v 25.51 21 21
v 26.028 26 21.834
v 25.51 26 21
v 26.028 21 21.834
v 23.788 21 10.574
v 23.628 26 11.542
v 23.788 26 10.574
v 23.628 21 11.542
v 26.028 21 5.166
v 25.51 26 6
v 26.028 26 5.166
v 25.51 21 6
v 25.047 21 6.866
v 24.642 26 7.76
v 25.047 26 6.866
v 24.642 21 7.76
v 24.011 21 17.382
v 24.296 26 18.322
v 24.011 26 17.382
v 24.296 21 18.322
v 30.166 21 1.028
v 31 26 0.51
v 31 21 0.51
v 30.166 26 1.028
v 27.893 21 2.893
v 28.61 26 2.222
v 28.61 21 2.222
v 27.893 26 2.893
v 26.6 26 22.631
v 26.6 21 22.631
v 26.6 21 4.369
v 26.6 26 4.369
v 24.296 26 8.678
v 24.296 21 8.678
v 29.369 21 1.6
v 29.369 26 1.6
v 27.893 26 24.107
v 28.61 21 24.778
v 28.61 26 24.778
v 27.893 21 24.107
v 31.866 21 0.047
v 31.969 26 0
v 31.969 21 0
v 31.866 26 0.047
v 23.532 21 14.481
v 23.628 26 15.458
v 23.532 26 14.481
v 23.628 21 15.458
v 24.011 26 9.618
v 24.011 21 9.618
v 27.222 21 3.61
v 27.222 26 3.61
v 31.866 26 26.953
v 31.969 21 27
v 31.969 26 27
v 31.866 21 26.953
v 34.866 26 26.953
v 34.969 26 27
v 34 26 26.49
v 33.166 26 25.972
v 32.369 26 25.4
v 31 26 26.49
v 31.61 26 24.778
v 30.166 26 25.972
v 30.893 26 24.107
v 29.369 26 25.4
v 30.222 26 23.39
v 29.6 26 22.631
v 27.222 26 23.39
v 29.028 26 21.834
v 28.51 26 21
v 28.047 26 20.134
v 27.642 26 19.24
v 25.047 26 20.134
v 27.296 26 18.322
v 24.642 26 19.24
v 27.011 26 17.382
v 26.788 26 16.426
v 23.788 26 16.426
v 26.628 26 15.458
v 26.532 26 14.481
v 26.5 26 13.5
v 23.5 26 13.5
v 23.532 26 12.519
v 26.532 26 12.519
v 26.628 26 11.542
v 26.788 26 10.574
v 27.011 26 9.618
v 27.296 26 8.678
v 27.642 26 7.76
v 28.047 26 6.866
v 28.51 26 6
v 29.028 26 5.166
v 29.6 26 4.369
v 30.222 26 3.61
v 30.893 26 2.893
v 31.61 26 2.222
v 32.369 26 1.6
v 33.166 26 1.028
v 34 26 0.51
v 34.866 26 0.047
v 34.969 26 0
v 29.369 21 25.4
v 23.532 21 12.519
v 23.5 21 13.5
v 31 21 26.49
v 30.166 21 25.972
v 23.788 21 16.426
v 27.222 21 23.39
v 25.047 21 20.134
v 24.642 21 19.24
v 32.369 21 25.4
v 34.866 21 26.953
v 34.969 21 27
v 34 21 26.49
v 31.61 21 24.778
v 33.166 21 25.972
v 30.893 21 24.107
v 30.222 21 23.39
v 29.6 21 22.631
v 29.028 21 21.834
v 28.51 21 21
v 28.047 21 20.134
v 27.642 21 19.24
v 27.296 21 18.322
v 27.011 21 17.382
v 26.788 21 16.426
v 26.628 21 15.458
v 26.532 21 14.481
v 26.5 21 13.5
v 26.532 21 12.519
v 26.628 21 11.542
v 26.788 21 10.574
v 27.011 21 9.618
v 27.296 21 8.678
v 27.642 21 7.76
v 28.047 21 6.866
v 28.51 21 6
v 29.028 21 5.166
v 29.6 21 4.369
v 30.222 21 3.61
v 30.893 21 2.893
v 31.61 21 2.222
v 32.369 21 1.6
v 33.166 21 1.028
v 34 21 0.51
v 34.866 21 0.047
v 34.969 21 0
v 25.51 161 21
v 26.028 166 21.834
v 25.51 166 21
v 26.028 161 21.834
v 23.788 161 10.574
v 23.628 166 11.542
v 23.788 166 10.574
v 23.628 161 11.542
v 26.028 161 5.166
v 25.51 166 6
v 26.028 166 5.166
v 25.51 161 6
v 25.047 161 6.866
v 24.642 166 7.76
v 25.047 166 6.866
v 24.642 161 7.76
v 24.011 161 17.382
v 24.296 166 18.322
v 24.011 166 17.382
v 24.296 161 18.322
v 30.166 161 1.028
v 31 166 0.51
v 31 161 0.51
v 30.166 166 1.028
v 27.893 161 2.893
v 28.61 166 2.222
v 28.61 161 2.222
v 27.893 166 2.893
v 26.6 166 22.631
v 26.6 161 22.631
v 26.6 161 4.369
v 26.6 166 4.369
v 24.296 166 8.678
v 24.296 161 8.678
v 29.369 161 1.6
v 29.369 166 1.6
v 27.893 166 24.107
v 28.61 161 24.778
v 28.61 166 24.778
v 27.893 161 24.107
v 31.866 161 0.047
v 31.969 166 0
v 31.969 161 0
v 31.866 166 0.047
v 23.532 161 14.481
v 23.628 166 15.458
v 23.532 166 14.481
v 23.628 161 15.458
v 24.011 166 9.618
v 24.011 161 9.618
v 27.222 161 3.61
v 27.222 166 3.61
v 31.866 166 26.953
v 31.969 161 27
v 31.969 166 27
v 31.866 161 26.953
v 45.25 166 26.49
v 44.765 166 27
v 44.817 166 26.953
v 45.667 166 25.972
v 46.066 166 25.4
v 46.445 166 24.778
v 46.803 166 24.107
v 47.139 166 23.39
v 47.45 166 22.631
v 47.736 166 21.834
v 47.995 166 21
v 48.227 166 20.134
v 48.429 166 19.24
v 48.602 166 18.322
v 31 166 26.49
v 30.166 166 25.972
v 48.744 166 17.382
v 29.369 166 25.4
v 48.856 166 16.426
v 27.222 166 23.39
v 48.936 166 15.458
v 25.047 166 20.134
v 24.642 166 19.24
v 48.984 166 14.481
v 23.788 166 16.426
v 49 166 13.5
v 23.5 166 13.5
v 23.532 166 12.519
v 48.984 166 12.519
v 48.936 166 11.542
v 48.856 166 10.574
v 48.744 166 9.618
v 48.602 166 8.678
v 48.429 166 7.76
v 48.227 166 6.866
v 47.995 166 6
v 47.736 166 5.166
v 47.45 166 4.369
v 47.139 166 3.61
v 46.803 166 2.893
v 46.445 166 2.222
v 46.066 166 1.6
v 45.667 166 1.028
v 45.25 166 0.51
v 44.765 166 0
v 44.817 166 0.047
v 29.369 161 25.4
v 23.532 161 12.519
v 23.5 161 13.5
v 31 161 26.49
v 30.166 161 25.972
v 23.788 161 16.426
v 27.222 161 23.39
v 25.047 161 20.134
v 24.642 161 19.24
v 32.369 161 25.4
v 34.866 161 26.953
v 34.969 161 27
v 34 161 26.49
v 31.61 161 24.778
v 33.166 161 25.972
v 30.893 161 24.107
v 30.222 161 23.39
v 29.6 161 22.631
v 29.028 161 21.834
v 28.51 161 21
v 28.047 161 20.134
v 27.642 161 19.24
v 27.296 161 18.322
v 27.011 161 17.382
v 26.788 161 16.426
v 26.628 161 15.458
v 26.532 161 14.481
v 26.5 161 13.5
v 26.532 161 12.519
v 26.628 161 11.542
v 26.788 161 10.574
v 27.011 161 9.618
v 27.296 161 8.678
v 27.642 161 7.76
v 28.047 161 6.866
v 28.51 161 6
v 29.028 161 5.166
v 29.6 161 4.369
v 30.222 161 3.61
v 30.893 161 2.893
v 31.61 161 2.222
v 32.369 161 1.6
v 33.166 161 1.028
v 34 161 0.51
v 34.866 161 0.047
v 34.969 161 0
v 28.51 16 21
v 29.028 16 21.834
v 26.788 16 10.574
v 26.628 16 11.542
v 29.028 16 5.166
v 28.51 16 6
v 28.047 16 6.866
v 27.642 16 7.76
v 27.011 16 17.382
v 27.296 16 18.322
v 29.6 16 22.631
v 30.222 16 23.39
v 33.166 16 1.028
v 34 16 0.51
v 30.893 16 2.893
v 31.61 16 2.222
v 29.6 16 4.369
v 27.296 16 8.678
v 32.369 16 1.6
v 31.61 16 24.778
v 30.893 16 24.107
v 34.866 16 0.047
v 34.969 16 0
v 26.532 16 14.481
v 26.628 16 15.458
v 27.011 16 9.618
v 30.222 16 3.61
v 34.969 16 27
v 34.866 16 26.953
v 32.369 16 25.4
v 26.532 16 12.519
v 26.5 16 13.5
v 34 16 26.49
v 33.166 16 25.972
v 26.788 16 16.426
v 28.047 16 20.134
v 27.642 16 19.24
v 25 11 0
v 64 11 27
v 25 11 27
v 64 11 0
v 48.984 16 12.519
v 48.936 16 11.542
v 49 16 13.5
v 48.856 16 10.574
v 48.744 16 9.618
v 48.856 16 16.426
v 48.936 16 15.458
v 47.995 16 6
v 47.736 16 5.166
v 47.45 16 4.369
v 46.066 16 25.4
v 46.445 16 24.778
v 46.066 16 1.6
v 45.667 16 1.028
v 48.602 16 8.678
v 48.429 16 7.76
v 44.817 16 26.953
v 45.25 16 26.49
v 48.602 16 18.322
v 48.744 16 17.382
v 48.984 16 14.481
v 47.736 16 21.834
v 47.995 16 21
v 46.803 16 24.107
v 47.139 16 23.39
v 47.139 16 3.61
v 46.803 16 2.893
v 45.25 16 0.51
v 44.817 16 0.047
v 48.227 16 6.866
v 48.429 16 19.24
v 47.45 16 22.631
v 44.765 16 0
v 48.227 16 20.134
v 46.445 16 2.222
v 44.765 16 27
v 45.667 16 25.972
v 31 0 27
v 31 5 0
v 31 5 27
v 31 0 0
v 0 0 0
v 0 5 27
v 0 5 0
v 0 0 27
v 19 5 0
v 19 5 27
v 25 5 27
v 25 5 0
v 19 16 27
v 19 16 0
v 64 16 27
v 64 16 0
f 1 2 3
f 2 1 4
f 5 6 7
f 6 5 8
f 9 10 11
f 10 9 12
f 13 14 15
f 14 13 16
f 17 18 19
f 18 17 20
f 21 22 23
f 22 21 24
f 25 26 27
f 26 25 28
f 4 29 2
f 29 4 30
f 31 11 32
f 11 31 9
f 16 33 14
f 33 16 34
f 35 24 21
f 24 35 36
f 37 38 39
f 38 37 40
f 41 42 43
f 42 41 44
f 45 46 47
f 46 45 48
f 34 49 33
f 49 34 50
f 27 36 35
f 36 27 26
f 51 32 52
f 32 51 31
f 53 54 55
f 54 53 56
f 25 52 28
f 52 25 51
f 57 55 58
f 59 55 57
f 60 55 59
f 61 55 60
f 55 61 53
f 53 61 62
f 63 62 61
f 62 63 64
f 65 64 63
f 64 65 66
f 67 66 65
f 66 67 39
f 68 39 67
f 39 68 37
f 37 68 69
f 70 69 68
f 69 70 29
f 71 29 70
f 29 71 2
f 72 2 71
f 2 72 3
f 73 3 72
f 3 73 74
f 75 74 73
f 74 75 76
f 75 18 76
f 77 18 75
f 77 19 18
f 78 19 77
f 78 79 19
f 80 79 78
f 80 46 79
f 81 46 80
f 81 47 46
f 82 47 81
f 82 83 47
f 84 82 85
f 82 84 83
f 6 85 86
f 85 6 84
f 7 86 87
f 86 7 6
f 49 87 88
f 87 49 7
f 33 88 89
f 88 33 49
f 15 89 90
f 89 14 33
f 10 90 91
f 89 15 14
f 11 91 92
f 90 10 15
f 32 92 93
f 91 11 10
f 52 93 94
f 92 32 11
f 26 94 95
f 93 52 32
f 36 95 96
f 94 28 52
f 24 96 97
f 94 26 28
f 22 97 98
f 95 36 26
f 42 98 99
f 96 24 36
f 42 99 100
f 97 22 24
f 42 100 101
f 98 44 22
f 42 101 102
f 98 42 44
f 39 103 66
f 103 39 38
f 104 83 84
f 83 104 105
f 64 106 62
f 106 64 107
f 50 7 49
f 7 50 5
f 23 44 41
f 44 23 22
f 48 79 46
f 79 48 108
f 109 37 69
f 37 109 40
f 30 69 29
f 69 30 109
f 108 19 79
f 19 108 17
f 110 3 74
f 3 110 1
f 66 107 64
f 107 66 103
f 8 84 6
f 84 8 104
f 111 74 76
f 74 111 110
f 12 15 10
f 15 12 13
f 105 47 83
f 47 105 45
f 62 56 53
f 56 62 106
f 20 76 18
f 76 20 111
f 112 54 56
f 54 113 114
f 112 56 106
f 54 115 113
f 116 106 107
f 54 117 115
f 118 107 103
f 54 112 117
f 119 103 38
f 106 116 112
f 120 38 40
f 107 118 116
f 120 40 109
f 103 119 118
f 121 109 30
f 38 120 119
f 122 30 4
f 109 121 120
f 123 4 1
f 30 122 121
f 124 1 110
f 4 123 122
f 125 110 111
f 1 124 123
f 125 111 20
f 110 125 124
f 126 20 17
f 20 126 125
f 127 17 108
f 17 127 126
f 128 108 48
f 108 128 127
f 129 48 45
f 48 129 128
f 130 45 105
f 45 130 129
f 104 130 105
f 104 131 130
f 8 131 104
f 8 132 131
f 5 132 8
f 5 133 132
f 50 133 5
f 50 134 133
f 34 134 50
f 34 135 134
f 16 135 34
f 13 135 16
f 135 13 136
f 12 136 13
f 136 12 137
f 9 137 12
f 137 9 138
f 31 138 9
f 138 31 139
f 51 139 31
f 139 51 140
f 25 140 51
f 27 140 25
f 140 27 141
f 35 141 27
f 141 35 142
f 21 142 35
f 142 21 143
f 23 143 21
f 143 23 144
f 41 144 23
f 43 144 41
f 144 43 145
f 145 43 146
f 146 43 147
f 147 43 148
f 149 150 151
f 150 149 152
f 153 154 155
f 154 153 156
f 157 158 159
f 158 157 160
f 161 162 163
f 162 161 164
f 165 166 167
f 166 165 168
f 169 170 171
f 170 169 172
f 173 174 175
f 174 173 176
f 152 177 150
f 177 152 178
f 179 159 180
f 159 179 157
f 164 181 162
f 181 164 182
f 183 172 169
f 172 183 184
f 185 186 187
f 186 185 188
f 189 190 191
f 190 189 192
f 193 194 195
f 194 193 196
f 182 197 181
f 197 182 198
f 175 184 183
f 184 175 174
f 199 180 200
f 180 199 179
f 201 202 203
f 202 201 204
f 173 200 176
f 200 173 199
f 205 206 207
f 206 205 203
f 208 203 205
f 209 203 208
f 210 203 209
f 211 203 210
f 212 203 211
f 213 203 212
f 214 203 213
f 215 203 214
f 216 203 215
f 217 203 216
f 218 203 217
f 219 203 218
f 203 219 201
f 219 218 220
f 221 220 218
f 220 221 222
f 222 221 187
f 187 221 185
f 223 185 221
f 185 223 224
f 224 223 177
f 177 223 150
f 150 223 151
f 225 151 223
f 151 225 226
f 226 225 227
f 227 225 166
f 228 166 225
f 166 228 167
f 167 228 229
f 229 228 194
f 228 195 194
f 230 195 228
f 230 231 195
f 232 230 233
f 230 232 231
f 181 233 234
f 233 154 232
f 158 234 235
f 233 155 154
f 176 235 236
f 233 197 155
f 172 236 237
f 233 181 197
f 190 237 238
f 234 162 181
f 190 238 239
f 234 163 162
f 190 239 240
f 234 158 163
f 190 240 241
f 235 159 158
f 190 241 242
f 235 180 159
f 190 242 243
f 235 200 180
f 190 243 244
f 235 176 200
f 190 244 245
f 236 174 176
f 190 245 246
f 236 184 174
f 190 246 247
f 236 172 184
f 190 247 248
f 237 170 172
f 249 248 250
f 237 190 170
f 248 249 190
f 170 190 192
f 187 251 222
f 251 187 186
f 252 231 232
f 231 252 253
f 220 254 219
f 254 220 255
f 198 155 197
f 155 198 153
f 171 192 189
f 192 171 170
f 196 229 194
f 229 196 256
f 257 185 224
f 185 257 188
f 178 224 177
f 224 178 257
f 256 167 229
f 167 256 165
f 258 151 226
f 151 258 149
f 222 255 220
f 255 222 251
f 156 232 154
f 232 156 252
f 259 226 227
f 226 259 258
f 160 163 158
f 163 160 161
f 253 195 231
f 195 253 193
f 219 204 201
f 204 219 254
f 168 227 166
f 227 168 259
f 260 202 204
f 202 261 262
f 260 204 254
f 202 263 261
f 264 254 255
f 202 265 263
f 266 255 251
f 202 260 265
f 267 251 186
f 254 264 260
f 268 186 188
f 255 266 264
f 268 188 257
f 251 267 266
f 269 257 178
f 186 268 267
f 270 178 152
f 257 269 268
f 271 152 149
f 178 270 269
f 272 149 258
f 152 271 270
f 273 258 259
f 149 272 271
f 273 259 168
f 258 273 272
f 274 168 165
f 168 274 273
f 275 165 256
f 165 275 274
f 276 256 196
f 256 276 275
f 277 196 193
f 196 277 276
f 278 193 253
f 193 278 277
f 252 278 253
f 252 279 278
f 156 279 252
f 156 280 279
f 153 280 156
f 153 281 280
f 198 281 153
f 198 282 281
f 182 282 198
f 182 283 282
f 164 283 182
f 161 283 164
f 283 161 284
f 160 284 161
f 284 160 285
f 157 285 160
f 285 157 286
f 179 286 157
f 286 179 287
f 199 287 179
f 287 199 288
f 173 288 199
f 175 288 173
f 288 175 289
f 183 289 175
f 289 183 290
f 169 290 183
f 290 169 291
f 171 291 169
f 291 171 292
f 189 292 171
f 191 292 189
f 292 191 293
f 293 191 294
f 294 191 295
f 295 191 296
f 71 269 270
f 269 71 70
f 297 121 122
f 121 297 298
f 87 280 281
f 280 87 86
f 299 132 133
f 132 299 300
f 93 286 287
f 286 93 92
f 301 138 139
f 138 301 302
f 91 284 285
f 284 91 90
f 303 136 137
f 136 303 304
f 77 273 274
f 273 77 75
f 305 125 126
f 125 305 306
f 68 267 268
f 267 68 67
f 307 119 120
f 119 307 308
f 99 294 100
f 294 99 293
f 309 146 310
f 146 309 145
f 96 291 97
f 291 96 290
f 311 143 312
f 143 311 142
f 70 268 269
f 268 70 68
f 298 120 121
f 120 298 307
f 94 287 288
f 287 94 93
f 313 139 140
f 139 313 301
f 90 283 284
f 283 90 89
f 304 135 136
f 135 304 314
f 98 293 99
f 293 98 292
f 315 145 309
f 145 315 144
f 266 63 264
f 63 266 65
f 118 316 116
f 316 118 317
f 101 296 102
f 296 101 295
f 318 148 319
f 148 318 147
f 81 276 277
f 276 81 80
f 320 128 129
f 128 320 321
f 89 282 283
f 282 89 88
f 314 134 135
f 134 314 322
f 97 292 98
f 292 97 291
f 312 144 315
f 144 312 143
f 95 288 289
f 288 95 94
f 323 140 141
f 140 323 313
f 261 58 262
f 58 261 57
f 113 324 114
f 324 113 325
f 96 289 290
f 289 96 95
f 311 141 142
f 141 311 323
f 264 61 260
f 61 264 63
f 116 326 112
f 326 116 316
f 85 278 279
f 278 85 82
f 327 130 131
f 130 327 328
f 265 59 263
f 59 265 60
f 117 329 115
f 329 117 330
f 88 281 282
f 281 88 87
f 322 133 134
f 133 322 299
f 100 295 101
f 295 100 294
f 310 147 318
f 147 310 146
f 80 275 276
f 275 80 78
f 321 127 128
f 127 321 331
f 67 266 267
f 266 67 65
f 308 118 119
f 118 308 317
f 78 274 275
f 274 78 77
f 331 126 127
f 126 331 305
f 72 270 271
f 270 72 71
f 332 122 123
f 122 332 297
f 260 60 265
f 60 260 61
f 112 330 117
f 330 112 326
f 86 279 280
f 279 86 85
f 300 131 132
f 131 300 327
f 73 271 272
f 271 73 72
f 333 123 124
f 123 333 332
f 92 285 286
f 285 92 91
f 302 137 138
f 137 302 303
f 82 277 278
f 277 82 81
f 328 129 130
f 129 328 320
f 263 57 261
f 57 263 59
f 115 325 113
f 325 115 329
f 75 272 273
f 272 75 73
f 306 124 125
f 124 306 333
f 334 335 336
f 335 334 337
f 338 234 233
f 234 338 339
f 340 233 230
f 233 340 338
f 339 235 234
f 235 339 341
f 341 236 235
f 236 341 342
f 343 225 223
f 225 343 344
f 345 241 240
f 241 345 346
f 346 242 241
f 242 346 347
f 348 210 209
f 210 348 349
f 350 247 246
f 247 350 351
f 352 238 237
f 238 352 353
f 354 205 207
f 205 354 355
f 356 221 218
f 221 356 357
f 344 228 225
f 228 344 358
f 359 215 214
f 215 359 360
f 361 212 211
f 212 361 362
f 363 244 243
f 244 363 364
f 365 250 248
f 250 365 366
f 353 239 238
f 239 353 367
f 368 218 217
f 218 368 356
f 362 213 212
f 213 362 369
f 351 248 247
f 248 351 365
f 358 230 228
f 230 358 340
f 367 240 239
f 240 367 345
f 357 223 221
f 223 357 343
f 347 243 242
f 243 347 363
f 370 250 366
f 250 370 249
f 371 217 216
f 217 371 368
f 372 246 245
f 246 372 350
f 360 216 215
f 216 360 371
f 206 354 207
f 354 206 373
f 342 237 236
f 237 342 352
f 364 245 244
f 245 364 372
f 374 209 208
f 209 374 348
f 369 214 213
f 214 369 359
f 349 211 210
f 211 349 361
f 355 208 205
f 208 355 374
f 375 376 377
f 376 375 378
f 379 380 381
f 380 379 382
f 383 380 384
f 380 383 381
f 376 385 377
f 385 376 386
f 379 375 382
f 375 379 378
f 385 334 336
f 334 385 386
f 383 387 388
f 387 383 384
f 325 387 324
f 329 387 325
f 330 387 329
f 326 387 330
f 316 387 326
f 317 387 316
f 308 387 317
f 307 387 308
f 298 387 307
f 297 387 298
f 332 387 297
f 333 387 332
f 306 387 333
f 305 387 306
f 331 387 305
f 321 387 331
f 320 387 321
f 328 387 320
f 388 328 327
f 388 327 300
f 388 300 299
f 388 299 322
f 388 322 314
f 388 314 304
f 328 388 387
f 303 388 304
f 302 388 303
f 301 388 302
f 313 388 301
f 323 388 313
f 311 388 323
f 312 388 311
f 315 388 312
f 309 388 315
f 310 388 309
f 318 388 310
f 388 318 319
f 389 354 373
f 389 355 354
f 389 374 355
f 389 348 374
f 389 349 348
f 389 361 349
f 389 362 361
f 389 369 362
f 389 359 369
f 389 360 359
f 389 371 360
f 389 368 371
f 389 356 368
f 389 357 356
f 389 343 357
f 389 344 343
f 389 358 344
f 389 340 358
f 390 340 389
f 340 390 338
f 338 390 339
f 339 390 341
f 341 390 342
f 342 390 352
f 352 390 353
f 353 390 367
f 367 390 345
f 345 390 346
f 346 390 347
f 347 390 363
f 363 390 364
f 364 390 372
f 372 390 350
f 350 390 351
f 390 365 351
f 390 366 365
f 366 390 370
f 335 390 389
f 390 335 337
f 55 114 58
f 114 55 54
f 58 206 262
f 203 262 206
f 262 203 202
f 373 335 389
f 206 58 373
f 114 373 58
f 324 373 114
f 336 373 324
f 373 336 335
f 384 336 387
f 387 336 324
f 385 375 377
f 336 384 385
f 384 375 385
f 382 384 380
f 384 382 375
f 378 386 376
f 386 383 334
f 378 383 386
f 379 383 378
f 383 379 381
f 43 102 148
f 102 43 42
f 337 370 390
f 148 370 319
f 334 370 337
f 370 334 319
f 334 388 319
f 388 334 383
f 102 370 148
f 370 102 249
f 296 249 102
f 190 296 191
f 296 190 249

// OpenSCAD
// Parametric spool holder for MBI R2 by Woale

// preview[view:north west, tilt:top diagonal]

// Unit
unit = 1; // [1:mm,25.4:inch]

// How long should the spool holder be (between ribbons) ?
spool_width = 130;

// What's the size of the spool hole ?
spool_hole_diameter = 30;

//variables
spl_l=spool_width*unit;
spl_d=spool_hole_diameter*unit;

//fix
$fn=48*2;
spl_r=spl_d/2*1;
plt_w=spl_d*1.5*1;

//plate holder
module plt_hld()
{
	//box1
	cube([31,5,spl_d]);
	//box2
	translate([28-9,0,0]) cube([6,16,spl_d]);
	//box3
	translate([28-9,11,0]) cube([plt_w,5,spl_d]);
}

//spool extensions
module spl_ext()
{
	translate([28-9+(plt_w/2)-(spl_r/5),16+5,spl_r]) rotate([270,0,0]) cylinder(5,spl_r,spl_r);
	translate([28-9+(plt_w/2)-(spl_r/5),16+5+spl_l+10,spl_r]) rotate([270,0,0]) cylinder(5,spl_r,spl_r);
}

//spool holder
module spl_hld()
{
	union()
	{
		difference()
		{
			union()
			{
				translate([28-9+(plt_w/2),11,spl_r]) rotate([270,0,0]) cylinder(spl_l+15+10,spl_r,spl_r);
				spl_ext();
			}
			translate([28-9+(plt_w/2),0,0]) cube([spl_d,spl_l+16+25,spl_d]);
		}
	translate([28-9+(plt_w/2),11,spl_r]) rotate([270,0,0]) scale([.5,1,1]) cylinder(spl_l+15+10,spl_r,spl_r);
	}
}

//level
translate([0,0,-spl_r/10]) intersection()
{
	union()
	{
		spl_hld();
		plt_hld();
	}
	translate([0,0,spl_r/10]) cube([28-9+plt_w,spl_l+16+20,spl_d-(spl_r/10*2)]);
}
